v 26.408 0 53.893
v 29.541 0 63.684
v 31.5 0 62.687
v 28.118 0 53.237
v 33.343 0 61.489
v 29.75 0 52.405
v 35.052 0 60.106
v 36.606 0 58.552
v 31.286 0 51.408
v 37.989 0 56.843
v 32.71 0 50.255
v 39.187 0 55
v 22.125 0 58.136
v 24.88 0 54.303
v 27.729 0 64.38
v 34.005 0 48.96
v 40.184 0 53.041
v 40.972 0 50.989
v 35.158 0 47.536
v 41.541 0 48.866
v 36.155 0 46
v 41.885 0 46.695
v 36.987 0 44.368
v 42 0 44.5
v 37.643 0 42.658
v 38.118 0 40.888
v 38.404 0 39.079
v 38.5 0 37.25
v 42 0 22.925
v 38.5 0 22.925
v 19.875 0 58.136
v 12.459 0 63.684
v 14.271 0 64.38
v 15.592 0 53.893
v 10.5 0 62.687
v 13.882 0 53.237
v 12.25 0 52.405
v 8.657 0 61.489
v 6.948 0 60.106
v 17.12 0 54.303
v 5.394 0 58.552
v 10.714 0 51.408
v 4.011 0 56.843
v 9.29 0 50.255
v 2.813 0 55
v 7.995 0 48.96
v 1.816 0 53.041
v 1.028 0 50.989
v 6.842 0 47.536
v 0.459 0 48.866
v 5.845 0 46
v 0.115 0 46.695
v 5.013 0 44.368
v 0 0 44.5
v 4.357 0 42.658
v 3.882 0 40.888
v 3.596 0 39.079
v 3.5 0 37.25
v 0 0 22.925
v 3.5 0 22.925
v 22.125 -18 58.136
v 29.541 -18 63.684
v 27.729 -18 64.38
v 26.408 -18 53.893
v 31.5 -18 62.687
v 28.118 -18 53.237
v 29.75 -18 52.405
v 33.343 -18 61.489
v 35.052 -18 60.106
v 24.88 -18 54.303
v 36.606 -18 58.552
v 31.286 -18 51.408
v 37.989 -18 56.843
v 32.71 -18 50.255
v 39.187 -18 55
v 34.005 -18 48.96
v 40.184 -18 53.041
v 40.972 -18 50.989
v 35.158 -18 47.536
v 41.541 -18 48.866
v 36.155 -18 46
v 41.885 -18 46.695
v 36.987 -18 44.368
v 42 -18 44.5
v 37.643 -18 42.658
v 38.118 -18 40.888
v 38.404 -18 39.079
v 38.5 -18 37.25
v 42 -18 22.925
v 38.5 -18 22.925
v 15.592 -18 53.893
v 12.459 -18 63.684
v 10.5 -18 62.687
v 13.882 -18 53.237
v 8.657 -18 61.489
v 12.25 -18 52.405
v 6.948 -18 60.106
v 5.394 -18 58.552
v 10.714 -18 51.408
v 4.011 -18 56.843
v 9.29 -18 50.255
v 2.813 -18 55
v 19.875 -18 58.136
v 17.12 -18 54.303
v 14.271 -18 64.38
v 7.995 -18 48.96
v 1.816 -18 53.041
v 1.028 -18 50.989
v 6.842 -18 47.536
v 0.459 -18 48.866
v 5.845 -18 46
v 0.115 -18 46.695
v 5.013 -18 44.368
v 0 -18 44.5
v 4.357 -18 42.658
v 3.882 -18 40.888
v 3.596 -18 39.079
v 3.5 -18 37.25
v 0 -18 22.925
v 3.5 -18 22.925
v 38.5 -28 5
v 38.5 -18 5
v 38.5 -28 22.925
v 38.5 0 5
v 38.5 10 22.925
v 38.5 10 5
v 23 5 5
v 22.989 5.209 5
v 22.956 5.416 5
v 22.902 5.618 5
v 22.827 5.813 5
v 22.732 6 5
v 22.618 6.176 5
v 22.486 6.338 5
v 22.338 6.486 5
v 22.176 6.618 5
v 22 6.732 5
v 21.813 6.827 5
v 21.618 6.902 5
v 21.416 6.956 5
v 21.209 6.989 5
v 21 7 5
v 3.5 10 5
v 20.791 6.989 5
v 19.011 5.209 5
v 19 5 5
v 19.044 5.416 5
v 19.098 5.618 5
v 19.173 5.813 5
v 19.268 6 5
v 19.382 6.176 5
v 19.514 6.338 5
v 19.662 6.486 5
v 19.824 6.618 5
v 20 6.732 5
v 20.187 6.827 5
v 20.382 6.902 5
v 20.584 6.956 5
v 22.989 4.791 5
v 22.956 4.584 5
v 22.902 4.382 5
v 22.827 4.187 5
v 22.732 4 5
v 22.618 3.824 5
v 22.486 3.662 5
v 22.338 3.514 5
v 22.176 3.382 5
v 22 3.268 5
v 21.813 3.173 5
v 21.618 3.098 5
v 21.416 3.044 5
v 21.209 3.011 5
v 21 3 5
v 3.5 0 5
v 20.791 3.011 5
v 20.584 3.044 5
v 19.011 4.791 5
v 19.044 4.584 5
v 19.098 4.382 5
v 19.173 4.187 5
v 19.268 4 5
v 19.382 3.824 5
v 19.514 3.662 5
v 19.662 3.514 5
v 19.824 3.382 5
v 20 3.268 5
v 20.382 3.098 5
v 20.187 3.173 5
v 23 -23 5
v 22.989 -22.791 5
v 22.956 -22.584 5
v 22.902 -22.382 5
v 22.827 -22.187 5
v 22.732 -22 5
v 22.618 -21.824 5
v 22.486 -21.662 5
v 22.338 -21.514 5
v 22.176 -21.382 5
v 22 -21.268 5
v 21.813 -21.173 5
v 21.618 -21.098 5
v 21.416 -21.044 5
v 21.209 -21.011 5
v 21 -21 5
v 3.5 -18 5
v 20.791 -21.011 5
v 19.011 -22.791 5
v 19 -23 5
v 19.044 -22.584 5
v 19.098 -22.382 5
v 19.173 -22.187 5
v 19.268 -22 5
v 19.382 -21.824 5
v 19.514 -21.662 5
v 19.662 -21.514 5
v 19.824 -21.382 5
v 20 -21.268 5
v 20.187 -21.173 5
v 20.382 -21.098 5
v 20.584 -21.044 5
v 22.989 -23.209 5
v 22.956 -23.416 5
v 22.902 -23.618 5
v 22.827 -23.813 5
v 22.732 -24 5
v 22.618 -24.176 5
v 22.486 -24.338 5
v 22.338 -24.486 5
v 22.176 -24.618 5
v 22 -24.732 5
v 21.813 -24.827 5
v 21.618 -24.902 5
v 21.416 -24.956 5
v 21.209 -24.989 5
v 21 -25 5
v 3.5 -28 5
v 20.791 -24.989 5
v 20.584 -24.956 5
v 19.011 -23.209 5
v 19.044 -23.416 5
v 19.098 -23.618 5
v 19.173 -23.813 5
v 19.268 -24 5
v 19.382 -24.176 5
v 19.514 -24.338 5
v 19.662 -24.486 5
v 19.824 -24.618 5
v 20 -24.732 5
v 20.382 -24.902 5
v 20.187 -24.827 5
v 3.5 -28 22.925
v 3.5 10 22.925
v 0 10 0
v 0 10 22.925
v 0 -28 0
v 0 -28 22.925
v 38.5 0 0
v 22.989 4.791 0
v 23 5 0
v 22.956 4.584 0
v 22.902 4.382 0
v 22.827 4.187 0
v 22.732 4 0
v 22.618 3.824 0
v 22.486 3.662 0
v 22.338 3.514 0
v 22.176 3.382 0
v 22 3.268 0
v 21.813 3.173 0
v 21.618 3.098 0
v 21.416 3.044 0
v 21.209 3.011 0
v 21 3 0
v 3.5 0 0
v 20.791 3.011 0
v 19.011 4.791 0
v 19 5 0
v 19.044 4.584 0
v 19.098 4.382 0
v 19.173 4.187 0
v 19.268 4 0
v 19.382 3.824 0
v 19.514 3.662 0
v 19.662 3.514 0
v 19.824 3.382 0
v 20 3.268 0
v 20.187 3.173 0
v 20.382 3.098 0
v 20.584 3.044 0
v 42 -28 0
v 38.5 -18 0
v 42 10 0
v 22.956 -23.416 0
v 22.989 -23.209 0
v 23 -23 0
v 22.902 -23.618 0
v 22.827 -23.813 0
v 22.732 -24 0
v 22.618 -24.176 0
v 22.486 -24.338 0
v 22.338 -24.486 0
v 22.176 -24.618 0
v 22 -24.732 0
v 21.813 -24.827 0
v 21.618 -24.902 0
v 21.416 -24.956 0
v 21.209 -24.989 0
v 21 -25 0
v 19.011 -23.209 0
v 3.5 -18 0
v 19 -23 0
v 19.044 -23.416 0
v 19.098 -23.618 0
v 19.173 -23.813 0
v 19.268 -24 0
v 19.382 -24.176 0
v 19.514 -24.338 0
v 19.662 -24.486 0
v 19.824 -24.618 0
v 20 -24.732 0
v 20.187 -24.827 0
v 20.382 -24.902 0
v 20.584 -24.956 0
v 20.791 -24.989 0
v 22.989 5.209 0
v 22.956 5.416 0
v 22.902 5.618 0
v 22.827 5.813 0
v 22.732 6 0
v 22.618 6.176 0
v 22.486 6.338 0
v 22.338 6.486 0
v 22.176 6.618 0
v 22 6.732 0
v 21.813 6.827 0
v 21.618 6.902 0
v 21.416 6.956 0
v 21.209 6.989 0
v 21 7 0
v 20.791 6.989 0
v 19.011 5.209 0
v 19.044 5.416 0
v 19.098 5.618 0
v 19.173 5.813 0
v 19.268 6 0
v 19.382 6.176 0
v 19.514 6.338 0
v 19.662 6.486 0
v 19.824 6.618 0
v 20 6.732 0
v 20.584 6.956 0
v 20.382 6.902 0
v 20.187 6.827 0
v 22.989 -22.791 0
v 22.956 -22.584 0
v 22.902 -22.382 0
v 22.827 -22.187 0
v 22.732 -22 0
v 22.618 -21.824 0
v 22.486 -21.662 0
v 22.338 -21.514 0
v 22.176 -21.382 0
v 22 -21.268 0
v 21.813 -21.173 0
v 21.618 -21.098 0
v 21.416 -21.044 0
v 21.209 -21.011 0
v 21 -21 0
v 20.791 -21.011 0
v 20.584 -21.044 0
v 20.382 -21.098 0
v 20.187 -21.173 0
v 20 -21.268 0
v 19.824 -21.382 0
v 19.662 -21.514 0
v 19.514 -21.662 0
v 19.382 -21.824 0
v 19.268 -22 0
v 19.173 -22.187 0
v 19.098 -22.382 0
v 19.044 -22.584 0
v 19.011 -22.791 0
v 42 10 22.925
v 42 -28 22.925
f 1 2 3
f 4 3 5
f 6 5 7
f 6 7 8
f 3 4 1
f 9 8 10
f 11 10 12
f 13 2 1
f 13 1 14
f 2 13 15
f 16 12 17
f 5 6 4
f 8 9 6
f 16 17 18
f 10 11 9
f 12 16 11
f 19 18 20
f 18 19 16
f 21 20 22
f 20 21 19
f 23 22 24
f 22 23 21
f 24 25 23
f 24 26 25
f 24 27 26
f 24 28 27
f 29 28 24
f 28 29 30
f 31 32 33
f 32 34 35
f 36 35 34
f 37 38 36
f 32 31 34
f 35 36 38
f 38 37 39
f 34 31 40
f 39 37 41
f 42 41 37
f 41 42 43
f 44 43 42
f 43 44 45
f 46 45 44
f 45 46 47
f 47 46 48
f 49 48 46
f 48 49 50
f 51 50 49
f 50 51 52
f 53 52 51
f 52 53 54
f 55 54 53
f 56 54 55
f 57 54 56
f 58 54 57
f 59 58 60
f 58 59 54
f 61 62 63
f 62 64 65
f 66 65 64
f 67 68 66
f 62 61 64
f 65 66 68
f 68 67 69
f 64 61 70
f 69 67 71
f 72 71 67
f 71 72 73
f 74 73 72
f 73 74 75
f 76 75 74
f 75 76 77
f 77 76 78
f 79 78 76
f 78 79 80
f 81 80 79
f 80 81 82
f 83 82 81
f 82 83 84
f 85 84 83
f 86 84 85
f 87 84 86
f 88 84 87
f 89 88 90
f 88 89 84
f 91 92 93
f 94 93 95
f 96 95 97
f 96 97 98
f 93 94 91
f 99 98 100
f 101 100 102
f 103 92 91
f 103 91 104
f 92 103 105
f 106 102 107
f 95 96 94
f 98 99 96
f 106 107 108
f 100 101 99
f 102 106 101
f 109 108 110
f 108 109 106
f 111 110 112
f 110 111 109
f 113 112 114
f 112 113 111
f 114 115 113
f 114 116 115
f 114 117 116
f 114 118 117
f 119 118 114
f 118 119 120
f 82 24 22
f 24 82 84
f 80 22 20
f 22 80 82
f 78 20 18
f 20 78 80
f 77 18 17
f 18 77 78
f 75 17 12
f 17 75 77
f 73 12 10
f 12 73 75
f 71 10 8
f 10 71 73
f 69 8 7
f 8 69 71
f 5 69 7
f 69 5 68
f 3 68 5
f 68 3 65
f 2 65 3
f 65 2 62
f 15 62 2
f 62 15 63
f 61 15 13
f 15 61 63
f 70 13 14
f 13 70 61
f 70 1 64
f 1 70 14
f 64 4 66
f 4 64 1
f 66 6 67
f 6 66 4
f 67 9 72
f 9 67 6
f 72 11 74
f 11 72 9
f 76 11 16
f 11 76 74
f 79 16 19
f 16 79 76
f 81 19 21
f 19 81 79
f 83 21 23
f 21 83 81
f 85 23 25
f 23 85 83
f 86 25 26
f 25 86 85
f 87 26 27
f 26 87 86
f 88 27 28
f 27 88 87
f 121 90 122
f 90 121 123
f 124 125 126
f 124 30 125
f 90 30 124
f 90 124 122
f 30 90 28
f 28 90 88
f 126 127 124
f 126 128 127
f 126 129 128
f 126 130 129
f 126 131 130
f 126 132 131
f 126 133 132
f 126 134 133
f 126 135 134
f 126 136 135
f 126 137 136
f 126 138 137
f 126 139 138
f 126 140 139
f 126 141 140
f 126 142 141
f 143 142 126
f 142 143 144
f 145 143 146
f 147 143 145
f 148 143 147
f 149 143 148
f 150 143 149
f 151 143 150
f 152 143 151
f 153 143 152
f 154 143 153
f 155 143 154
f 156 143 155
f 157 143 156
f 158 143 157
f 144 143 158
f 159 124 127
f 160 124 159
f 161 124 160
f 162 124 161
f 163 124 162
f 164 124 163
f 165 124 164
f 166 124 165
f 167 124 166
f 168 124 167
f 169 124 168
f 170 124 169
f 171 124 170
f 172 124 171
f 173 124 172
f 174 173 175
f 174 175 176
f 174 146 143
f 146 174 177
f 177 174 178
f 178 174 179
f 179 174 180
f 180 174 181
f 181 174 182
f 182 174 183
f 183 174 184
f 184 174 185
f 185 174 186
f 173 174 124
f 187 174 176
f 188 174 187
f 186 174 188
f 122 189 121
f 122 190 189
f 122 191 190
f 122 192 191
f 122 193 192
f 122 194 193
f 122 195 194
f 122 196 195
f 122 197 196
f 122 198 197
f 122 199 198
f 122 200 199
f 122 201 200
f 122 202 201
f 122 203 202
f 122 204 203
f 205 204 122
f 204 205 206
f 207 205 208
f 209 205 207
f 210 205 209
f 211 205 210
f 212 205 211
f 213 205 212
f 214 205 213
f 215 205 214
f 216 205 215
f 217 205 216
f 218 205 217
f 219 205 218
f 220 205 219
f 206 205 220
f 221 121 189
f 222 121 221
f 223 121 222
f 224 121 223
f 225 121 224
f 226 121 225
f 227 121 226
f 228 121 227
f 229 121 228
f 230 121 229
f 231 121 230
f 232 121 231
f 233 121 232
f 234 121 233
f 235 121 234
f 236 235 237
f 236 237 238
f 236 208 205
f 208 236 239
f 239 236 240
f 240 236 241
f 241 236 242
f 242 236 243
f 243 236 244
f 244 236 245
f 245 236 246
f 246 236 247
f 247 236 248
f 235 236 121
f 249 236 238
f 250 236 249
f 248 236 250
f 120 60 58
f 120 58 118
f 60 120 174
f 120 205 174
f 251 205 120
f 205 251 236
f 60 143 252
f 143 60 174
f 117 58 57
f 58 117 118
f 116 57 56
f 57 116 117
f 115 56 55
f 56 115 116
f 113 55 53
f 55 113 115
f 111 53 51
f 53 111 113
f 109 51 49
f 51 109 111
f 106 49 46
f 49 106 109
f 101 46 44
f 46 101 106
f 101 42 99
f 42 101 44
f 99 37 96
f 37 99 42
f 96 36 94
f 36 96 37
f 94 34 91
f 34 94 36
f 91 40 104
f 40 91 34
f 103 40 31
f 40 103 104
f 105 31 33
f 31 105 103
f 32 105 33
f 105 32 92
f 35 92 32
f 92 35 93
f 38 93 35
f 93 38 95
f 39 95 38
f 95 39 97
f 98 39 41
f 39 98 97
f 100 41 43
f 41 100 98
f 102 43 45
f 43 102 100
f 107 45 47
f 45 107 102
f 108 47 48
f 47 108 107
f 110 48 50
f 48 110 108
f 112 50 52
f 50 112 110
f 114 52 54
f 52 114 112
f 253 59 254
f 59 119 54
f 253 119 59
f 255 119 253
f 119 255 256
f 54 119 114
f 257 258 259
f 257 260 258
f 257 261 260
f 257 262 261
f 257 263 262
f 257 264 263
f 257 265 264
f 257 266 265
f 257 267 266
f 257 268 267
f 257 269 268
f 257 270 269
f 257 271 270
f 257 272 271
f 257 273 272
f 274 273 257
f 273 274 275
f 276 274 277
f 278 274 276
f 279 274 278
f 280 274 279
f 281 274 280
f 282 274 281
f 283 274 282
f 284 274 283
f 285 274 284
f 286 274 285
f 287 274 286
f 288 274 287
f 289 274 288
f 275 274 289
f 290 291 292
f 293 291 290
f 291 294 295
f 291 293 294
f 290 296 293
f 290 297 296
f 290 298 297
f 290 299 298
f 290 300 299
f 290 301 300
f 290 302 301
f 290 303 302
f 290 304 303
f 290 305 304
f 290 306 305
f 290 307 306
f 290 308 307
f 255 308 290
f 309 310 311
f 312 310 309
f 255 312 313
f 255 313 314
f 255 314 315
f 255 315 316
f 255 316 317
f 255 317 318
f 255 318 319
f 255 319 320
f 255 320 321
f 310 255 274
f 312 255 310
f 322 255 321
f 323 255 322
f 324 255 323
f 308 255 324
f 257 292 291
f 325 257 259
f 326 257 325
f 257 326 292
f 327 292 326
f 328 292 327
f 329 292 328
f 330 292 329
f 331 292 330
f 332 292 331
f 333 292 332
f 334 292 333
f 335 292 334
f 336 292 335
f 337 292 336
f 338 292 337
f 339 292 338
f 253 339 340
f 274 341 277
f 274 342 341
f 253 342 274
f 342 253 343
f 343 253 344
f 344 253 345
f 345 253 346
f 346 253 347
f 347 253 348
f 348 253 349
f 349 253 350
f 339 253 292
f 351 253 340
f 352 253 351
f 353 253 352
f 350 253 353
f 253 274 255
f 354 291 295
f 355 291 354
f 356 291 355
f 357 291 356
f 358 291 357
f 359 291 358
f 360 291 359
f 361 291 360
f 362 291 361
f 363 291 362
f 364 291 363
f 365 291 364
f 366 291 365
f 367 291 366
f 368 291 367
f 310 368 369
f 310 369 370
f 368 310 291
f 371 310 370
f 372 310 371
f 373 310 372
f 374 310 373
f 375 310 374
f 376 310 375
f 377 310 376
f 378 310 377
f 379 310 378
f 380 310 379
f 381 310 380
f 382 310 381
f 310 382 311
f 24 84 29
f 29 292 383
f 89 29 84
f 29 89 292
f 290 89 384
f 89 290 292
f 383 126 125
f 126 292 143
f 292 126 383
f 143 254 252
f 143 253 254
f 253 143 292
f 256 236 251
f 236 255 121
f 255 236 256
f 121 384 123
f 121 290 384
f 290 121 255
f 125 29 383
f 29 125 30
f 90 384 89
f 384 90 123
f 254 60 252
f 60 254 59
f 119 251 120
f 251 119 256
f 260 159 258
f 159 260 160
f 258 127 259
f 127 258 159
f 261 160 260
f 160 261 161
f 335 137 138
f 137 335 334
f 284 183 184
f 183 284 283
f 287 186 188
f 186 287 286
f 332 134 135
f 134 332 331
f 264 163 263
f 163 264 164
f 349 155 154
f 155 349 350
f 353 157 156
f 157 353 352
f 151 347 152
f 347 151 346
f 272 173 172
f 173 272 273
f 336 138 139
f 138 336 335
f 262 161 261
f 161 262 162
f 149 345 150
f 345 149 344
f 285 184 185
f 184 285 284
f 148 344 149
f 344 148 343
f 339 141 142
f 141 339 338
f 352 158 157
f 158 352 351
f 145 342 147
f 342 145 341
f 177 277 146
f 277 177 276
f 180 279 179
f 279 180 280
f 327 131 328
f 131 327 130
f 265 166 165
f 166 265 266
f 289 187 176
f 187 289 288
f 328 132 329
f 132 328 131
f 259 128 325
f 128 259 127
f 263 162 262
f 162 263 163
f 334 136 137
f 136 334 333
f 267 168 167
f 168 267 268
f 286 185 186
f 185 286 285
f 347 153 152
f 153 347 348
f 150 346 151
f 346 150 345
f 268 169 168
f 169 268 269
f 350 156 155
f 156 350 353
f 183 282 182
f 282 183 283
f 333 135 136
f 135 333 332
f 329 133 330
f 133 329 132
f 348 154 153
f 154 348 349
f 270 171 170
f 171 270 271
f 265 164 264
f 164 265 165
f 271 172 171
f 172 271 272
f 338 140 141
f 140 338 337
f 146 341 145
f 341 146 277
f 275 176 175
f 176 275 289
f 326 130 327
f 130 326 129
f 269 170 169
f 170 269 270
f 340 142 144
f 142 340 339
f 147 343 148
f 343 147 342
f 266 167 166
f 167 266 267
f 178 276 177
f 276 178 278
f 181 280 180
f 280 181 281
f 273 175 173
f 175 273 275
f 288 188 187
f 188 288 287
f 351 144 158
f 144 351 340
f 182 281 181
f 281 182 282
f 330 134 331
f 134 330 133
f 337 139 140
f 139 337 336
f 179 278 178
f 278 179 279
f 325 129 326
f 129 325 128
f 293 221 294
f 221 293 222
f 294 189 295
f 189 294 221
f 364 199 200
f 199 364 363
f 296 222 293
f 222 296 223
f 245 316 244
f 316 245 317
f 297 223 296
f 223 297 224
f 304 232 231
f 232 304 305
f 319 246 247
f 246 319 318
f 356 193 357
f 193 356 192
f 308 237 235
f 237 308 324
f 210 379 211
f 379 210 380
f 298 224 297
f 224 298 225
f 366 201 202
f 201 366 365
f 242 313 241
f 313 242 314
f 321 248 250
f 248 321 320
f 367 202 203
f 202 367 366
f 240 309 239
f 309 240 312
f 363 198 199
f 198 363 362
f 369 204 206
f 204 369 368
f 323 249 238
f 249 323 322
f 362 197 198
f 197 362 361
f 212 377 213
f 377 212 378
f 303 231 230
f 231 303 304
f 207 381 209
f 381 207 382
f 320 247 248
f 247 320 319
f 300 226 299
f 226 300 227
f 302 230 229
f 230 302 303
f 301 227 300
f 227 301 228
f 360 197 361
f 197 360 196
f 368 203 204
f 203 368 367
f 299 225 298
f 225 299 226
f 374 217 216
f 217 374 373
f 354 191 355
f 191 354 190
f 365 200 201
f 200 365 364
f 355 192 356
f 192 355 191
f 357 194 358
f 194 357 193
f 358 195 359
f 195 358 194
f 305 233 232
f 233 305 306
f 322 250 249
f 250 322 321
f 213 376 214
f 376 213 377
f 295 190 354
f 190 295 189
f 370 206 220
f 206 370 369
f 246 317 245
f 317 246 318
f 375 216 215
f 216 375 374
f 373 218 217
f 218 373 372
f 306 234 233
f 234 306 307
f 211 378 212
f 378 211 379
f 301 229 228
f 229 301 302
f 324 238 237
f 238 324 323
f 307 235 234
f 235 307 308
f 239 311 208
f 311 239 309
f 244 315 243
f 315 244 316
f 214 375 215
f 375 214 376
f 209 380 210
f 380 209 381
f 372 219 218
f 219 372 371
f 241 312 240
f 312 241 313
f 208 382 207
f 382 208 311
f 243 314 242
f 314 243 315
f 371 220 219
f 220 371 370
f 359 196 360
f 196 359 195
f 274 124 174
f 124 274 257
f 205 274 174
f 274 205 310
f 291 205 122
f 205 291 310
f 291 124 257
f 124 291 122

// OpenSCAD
/*  cable management clip
    2017-10-13 Russell Salerno
    
    v2 with more automated parameter generation
    notes: open base is preferable as it makes the clamp more flexible & crack-resistant
    
*/


//Clip parameters

// [Distance clip extends from the wall]
depth = 65.5;

// [Height of arms]
height = 18.0;

// [Width of clip, cannot exceed depth]
width = 42.0;

// [Jaw thickness at top]
jaws = 9.0;

// [Space between jaws]
throat = 2.25;

// [Arm thickness]
side_thickness = 3.5;

// [Base thickness]
base_thickness = 5.0;

// [Distance each side wing extends from the arms]
base_sides = 10;

// [Leave at 0 for default ratio of 0.35*height]
base_height_ratio = 0;

// [Minkowski radius for edges]
radius = 2.25;

//Open or closed base? (choose closed if num_holes=1 or 3)
base_type = "open";  // [open, closed]

//Number of screw holes
num_holes = 2;      // [0, 1, 2, 3]

//Hole diameter
hole_diameter = 4;  // [0:10]

//Test render
test_render = true; // [true, false]

module null() {}

//sample sizes
//small
/*
depth = 28;
height = 10.0;
width = 15.0;
jaws = 4.0;
throat = 1.0;
side_thickness = 1.75;
base_thickness = 3.0;
base_sides = 8;
base_height_ratio = 0.25;        // [leave 0 for default]
radius = 0.75;
*/

//small/tall 
/* 
depth = 34;
height = 10.0;
width = 15.0;
jaws = 4.0;
throat = 1.0;
side_thickness = 2.0;
base_thickness = 3.0;
base_sides = 8;
base_height_ratio = 0;        // [leave 0 for default]
radius = 0.75;
*/

//medium
/*
depth = 38;
height = 12.0;
width = 25.0;
jaws = 5.0;
throat = 2.0;
side_thickness = 2.25;
base_thickness = 3.5;
base_sides = 9;
base_height_ratio = 0;        // [leave 0 for default]
radius = 0.95;
*/

//large (original size)
/*
depth = 65.5;
height = 18.0;
width = 42.0;
jaws = 9.0;
throat = 2.25;
side_thickness = 3.5;
base_thickness = 5.0;
base_sides = 10;
base_height_ratio = 0;        // [leave 0 for default]
radius = 2.25;
*/

$fn=60;
minkr=test_render ? 0:radius;   //minkowski takes a while to render, set to zero for testing

clipy=depth-minkr*2;
//clipx=width-minkr*2;
clipx=(width > depth)? clipy:width-minkr*2;     // width can't exceed depth
clipz=height-minkr*2;
clipthk=side_thickness-minkr;
clipjaws=jaws-minkr;
clipbase=base_thickness-minkr;

//throata1=22;
//throata2=25;
throata1=12*(depth/width);
throata2=10*(depth/(width-2*clipthk));
throaty=9/11*jaws;
throatx=throat+2*minkr;

basez=base_sides;
basey=(base_height_ratio == 0)? depth*0.35:depth*base_height_ratio;
baseholed=hole_diameter;

module throat() {
    translate([clipx/2, clipy-clipx/2, 0]) polygon([
        [clipx/2*-sin(throata1), clipx/2*cos(throata1)],
        [clipx/2, clipy],
        [clipx/2*sin(throata1), clipx/2*cos(throata1)], 
        [throatx/2, -throaty+clipx/2],
        [(clipx-clipthk*2)/2*sin(throata2), clipx/2*cos(throata2)-clipjaws-clipthk],
        [(clipx-clipthk*2)/2*-sin(throata2), clipx/2*cos(throata2)-clipjaws-clipthk],
        [-throatx/2, -throaty+clipx/2]]);
}

module base() {
    translate([0, 0, -basez]) linear_extrude(clipz+2*basez) difference() {
        square([clipx, basey]);
        translate([clipthk, clipbase, 0]) square([clipx-clipthk*2, basey-clipbase]);
    }
}

module holes() {
    translate([-minkr, 0, -minkr]) {

        if (num_holes == 1 || num_holes == 3) {
            translate([clipx/2+minkr, base_thickness, height/2]) rotate([90,0,0]) cylinder(d=baseholed, h=base_thickness+minkr);        // hole 1 of 1 hole base
         }

        if (num_holes == 2 || num_holes == 3){
            translate([clipx/2+minkr, base_thickness, -basez/2]) rotate([90,0,0]) cylinder(d=baseholed, h=base_thickness+minkr);        // hole 1 of 2 hole base
            translate([clipx/2+minkr, base_thickness, height+basez/2]) rotate([90,0,0]) cylinder(d=baseholed, h=base_thickness+minkr);  // hole 2 of 2 hole base
        }

        if (base_type == "open") {
            translate([side_thickness+minkr, 0, 0]) linear_extrude(height) square([clipx-clipthk*2-minkr*2, base_thickness]);   // hole for open base
        }
        translate([0, -2*minkr, -basez]) linear_extrude(clipz+2*basez+2*minkr) square([clipx+2*minkr, 2*minkr]);            // flatten the bottom
    }
}

module mainshape() {
    linear_extrude(clipz) difference() {
        hull() {
            square([clipx, 1]);
            translate([clipx/2, clipy-clipx/2, 0]) circle(d=clipx);
        }
        hull() {
            translate([clipthk, clipbase, 0]) square([clipx-clipthk*2, 1]);
            translate([clipx/2, clipy-clipjaws-(clipx-clipthk)/2, 0]) circle(d=clipx-clipthk*2);
        }
        throat();
    }
    base();
}


rotate ([90, 0, 0]) difference() {
    minkowski() {
        mainshape();
        sphere(r=minkr);
    }
    holes();
}
